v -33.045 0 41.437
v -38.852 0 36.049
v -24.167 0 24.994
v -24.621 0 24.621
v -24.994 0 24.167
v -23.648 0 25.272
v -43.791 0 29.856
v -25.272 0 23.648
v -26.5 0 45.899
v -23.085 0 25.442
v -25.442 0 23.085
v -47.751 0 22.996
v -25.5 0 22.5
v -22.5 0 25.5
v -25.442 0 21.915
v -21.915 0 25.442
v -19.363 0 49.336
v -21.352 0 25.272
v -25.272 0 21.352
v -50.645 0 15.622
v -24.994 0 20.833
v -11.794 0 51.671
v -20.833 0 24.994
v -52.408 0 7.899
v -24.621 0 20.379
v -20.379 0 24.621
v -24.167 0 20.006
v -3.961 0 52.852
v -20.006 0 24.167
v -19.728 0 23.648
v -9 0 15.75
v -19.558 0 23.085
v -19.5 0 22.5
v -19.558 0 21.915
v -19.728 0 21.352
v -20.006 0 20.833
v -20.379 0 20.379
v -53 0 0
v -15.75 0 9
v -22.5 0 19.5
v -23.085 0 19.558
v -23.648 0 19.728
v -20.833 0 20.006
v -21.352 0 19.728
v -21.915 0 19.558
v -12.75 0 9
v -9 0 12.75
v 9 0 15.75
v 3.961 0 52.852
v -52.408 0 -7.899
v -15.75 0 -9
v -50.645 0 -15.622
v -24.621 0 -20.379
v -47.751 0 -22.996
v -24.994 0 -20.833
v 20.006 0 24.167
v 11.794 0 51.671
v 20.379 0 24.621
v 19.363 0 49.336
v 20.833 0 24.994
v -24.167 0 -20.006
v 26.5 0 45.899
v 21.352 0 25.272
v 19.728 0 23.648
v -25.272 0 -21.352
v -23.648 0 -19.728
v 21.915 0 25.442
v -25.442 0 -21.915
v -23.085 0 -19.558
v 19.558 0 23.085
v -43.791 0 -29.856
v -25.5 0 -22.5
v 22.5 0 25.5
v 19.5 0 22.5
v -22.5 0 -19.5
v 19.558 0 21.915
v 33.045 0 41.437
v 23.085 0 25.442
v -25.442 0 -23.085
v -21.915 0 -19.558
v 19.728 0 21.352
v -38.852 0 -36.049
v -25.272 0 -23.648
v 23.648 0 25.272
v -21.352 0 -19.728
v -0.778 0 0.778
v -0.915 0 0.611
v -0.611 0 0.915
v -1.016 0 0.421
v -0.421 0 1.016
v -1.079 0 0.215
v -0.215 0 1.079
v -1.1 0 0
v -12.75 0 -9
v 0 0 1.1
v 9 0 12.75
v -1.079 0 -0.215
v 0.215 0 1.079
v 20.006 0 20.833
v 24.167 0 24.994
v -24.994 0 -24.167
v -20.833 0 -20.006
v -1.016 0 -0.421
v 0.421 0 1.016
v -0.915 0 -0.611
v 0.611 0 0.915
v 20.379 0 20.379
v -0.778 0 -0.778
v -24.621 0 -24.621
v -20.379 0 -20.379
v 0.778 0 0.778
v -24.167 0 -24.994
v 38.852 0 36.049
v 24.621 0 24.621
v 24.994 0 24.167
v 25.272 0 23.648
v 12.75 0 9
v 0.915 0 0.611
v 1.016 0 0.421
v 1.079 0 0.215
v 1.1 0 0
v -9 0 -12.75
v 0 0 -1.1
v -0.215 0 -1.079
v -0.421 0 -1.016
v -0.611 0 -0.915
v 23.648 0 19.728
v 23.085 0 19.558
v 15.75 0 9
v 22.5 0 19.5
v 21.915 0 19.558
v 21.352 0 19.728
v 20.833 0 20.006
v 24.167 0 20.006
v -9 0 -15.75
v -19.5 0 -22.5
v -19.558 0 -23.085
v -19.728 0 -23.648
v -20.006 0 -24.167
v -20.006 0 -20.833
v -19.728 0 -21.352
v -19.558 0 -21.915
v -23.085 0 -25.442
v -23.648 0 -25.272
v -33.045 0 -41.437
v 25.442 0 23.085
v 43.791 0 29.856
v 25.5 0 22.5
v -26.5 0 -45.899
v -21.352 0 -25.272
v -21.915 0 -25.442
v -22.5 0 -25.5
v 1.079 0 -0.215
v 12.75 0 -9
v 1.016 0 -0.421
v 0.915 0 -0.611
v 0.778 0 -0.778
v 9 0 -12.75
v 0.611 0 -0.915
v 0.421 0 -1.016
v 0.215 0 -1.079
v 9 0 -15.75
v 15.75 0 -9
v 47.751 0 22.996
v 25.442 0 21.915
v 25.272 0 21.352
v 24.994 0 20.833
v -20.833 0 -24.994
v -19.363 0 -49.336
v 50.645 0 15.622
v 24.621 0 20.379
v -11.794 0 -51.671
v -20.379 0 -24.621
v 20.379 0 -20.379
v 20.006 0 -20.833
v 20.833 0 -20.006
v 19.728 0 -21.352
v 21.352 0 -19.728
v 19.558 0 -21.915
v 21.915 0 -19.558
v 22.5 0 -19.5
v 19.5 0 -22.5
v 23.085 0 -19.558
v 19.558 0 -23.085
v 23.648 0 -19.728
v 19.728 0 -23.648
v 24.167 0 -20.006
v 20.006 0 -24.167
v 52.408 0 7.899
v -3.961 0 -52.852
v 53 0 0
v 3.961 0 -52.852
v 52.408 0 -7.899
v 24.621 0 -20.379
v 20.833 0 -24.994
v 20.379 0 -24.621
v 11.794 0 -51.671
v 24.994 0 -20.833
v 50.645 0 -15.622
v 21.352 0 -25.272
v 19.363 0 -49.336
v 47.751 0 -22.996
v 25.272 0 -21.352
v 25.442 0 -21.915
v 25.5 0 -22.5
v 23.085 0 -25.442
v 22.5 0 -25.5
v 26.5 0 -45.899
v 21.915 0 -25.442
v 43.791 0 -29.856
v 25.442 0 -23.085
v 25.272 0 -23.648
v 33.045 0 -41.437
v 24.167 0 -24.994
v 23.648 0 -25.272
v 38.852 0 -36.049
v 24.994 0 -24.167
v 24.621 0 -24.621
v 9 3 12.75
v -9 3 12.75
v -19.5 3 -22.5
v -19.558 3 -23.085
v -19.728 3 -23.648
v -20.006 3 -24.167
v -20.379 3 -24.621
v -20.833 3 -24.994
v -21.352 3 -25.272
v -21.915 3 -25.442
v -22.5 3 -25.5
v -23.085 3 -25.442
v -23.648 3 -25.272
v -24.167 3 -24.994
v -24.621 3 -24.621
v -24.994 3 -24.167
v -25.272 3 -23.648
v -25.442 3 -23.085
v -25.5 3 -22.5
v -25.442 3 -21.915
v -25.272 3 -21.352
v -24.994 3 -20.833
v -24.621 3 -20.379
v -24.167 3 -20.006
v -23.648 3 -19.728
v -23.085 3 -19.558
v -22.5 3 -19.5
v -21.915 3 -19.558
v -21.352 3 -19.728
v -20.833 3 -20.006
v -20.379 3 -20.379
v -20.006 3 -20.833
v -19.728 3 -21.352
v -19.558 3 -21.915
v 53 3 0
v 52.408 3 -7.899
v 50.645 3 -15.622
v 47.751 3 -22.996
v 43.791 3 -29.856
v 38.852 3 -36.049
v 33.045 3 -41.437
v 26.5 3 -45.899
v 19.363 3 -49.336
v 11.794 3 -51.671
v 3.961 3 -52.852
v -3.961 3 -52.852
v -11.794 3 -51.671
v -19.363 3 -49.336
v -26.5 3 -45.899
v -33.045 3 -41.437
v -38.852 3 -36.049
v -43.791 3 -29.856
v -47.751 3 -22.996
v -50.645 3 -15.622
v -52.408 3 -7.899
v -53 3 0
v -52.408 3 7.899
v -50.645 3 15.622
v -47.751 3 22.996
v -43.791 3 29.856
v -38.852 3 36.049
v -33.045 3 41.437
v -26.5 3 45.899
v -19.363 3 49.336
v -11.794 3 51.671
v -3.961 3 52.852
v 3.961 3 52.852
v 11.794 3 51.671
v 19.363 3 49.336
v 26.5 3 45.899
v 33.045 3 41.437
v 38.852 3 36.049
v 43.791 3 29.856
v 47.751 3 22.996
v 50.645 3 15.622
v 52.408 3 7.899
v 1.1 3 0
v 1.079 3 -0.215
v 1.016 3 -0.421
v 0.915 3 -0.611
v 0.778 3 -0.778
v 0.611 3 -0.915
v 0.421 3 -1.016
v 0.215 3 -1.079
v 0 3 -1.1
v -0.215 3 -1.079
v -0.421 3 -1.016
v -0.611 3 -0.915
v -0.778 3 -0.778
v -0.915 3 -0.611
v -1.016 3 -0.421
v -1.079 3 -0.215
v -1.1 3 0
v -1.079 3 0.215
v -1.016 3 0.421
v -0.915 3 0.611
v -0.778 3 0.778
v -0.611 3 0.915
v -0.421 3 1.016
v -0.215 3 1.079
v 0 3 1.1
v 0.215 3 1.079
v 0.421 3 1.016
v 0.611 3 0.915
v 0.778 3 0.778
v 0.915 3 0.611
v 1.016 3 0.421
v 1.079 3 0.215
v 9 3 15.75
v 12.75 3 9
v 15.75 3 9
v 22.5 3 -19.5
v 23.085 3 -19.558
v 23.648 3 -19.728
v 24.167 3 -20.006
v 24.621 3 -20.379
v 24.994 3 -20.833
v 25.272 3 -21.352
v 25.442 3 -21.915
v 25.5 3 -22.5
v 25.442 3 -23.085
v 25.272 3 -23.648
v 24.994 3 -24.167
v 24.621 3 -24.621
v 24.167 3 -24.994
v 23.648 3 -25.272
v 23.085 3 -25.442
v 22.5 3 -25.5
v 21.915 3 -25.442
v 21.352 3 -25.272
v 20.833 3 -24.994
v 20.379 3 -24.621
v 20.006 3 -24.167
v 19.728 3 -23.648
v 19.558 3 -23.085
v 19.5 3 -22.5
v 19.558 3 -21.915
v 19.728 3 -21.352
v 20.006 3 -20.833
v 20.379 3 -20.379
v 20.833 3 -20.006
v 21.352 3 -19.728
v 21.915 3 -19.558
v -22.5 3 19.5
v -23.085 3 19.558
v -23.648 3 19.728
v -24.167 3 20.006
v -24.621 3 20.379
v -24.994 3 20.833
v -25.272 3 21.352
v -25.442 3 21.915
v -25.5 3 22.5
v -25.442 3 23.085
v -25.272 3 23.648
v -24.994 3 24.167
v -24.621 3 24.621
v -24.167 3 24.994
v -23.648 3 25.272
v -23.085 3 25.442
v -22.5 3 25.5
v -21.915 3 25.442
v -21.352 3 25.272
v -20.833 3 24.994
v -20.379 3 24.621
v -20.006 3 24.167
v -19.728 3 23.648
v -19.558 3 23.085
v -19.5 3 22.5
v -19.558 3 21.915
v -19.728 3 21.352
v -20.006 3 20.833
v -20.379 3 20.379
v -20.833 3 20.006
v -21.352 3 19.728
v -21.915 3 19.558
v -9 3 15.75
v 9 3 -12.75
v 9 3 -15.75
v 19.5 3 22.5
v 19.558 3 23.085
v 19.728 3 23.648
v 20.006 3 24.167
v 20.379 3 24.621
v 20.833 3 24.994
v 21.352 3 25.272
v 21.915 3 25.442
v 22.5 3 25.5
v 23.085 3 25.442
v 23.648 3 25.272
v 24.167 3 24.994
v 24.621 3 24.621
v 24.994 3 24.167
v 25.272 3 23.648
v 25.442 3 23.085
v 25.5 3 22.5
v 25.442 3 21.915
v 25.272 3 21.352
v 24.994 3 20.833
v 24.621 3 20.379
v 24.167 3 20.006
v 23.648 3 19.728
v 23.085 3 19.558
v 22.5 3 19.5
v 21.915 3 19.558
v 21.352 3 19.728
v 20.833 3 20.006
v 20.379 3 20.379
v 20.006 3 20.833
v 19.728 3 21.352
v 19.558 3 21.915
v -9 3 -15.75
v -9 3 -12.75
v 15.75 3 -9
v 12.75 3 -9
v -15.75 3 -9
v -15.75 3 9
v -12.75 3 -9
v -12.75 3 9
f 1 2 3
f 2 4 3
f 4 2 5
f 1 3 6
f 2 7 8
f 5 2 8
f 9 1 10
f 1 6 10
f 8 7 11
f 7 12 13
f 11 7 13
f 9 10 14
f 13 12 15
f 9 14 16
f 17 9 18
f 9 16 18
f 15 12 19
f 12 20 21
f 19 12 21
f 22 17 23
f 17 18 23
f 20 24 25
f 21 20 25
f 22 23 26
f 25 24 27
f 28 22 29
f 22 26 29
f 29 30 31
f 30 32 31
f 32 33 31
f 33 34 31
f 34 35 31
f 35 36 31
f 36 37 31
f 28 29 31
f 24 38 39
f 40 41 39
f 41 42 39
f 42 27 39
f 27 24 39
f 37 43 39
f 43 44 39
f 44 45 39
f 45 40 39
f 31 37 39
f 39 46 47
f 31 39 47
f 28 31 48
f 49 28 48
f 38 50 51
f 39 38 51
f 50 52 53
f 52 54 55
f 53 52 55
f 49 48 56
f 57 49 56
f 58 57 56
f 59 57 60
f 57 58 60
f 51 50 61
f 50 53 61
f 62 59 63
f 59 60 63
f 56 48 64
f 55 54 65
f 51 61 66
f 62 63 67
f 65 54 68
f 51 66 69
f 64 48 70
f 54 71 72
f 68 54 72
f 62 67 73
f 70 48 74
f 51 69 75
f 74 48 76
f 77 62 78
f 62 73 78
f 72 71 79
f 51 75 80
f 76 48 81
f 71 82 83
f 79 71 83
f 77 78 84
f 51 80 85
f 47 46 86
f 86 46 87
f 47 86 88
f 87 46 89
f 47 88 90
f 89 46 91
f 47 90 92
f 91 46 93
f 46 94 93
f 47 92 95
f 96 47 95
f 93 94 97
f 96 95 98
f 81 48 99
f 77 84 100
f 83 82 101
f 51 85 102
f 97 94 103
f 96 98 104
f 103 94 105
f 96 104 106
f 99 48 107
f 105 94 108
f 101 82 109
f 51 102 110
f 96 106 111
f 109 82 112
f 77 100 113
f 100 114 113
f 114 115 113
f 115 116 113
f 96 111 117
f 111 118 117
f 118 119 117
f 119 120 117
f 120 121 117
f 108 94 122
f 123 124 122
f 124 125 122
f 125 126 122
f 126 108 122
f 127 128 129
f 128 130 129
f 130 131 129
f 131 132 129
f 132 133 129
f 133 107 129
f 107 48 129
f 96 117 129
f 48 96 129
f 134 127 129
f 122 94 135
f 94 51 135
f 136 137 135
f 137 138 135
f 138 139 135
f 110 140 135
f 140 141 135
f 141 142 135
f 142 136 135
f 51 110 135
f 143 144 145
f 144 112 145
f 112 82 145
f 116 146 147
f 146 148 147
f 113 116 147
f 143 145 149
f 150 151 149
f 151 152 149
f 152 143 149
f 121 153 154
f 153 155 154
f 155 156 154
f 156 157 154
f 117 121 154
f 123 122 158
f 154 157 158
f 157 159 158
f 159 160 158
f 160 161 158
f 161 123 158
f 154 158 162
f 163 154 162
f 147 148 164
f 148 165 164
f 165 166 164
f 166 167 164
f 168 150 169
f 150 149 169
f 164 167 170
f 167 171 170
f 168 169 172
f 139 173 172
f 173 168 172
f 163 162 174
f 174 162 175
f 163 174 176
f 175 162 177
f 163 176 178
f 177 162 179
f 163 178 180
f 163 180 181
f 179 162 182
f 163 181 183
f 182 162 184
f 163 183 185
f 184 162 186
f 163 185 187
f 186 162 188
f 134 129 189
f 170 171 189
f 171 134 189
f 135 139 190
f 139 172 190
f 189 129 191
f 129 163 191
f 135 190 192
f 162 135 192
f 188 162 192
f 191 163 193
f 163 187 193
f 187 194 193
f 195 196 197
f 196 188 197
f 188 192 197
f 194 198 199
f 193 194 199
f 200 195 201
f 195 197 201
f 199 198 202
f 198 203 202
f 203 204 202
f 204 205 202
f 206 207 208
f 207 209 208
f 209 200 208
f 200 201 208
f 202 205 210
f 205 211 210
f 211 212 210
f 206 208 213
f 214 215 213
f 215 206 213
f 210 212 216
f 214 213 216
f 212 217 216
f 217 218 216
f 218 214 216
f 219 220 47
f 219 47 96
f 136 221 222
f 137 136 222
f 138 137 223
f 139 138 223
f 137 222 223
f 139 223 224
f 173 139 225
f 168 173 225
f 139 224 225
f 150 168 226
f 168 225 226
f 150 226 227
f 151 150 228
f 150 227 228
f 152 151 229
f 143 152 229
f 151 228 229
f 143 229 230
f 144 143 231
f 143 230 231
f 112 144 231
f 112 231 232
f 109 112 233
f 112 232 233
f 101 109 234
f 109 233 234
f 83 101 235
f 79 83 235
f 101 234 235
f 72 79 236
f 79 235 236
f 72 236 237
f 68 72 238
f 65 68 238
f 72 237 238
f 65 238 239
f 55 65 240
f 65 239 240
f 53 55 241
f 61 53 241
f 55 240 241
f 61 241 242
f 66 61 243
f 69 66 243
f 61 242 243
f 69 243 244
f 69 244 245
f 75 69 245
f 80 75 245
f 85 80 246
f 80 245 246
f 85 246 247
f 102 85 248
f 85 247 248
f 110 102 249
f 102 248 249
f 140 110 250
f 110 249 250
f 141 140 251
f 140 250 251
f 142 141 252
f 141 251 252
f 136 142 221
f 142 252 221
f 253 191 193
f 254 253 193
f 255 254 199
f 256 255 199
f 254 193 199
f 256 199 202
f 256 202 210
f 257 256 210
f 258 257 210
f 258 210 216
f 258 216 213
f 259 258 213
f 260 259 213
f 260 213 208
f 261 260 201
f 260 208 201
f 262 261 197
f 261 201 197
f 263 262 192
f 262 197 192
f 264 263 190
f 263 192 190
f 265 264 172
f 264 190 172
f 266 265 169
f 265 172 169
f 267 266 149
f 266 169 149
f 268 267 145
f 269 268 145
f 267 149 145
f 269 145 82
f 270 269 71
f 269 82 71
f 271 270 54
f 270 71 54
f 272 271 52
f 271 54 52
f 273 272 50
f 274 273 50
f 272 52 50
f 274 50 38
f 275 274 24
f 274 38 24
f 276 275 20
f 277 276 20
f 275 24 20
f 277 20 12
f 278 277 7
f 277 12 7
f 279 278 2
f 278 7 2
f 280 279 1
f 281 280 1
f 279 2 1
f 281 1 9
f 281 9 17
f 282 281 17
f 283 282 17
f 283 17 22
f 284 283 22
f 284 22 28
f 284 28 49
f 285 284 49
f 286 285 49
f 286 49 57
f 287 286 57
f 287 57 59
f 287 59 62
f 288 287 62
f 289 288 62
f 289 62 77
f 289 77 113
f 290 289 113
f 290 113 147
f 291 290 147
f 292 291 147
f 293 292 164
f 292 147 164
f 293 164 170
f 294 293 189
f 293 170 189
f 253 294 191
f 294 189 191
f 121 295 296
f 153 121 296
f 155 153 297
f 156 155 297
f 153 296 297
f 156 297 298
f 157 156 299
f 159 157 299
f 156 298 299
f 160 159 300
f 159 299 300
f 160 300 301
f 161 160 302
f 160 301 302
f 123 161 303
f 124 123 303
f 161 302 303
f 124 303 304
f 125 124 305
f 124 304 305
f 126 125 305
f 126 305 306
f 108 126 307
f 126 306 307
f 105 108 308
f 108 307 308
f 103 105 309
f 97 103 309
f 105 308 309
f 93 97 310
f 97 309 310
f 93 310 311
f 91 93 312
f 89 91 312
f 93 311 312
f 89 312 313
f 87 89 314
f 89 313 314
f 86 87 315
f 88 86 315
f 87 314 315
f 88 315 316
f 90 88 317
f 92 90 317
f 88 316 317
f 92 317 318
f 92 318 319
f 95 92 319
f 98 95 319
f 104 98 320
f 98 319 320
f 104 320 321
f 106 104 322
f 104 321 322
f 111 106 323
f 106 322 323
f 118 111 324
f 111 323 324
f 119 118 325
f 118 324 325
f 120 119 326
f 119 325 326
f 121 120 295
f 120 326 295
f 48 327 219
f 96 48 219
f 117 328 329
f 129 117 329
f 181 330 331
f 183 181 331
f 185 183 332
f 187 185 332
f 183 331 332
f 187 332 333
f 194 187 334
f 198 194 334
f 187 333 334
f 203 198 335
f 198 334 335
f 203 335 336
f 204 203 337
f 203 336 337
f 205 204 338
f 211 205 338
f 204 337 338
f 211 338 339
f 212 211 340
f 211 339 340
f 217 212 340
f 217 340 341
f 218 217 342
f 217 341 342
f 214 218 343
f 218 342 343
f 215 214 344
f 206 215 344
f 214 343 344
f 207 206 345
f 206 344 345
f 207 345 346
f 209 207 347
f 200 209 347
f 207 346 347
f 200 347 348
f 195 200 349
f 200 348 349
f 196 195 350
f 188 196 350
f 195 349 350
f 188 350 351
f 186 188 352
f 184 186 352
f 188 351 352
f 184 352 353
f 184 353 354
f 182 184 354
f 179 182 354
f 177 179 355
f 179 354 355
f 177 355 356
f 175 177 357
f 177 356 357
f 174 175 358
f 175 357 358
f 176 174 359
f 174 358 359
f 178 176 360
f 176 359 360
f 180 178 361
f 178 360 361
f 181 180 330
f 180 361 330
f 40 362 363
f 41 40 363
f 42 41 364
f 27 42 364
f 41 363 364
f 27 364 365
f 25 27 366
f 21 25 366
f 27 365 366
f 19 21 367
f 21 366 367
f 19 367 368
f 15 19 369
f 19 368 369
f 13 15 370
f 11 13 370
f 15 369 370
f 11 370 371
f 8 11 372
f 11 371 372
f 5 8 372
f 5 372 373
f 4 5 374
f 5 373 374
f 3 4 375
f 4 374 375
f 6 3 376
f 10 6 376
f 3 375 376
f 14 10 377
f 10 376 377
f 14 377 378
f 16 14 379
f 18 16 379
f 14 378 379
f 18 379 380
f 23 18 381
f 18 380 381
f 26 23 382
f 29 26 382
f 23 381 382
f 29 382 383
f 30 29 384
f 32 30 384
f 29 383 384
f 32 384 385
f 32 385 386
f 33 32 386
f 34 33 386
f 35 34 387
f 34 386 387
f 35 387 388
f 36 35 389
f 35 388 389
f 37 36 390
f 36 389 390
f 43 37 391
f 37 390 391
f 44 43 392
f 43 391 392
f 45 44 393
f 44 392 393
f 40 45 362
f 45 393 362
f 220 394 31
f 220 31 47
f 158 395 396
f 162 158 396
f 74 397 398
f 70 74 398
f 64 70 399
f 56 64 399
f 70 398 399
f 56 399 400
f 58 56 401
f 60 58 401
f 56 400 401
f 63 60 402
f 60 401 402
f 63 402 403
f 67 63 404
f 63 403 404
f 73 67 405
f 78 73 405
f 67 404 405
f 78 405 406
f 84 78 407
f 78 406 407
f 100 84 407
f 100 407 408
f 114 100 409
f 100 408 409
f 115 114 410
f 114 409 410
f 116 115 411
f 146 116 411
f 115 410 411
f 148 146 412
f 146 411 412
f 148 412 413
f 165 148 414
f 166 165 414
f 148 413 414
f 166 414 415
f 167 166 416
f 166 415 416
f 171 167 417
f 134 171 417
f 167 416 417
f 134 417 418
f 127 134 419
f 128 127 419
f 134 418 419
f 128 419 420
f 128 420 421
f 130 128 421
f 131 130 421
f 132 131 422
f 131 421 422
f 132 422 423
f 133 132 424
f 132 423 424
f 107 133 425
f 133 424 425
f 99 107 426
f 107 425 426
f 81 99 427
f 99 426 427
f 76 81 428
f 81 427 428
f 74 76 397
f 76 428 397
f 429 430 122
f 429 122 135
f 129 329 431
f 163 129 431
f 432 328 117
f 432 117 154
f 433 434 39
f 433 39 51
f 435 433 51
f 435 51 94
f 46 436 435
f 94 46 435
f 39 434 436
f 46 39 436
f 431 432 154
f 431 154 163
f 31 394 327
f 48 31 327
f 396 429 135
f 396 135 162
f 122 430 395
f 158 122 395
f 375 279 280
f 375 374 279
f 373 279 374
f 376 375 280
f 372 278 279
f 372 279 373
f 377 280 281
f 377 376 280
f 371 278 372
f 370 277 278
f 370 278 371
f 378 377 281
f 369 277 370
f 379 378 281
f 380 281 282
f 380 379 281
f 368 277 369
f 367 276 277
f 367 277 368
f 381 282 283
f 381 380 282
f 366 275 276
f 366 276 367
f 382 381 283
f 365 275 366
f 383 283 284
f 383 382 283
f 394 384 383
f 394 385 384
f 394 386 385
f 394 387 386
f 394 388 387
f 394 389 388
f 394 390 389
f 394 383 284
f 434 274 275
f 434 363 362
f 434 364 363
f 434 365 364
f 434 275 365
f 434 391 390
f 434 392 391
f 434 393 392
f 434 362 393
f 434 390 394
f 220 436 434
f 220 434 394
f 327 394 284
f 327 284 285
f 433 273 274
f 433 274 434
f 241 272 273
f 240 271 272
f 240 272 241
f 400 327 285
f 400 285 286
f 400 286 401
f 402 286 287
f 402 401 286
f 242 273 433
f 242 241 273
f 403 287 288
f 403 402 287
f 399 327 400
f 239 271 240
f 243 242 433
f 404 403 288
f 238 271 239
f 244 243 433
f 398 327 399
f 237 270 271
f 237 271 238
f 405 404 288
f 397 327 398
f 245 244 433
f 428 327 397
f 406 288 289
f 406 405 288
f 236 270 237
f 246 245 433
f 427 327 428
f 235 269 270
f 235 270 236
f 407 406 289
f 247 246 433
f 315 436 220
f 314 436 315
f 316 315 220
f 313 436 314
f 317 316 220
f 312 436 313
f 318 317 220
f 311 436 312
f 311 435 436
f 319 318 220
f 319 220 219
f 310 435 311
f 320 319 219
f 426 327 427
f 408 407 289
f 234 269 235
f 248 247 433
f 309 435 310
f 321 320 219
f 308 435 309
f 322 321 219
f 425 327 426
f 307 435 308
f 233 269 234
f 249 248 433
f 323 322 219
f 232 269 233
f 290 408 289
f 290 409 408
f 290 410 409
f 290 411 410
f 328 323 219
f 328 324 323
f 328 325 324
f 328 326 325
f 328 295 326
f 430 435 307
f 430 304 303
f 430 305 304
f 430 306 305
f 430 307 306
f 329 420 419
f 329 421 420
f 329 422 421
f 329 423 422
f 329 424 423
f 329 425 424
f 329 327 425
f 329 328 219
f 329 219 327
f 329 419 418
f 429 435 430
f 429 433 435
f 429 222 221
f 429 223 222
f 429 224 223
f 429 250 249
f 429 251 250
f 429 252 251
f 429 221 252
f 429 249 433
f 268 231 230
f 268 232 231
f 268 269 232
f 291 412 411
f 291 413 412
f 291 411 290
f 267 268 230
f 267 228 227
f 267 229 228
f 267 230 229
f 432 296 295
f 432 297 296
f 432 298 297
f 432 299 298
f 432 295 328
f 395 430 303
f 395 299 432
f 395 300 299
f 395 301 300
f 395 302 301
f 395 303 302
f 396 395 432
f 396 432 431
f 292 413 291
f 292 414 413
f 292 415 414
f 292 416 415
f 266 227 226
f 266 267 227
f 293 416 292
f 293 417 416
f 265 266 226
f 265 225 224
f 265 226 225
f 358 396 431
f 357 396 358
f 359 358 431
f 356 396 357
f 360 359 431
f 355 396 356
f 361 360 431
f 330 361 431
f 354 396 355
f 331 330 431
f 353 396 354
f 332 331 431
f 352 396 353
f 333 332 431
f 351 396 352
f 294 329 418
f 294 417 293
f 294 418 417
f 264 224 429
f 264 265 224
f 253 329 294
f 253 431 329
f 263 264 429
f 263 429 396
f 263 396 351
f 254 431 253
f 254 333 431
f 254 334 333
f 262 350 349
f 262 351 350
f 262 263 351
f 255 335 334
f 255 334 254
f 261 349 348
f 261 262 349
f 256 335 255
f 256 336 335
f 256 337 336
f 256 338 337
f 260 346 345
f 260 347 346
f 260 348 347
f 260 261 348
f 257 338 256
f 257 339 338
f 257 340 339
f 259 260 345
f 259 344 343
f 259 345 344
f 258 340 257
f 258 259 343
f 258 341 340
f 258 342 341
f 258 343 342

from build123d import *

# Parameters (mm, degrees)
SKETCH1_R           = 53
BOSS_EXTRUDE1_DEPTH = 3
SKETCH2_R           = 1.1
SKETCH2_W           = 18
SKETCH2_H           = 3
SKETCH2_W_2         = 3
SKETCH2_H_2         = 18
CUT_EXTRUDE1_DEPTH  = 3
SKETCH4_R           = 3
CUT_EXTRUDE2_DEPTH  = 3
CIRPATTERN1_COUNT   = 4


with BuildPart() as part:
    # Sketch1 → Boss-Extrude1 (new body)
    with BuildSketch(Plane(origin=(0, 0, 0), x_dir=(1, 0, 0), z_dir=(0, 1, 0))):
        Circle(SKETCH1_R)
    extrude(amount=BOSS_EXTRUDE1_DEPTH)

    # Sketch2 → Cut-Extrude1 (cut)
    with BuildSketch(Plane(origin=(0, 3, 0), x_dir=(1, 0, 0), z_dir=(0, 1, 0))):
        Circle(SKETCH2_R)
        with Locations((0, 14.25)):
            Rectangle(SKETCH2_W, SKETCH2_H)
        with Locations((-14.25, 0)):
            Rectangle(SKETCH2_W_2, SKETCH2_H_2)
        with Locations((0, -14.25)):
            Rectangle(SKETCH2_W, SKETCH2_H)
        with Locations((14.25, 0)):
            Rectangle(SKETCH2_W_2, SKETCH2_H_2)
    extrude(amount=-CUT_EXTRUDE1_DEPTH, mode=Mode.SUBTRACT)

    # Sketch4 → Cut-Extrude2 (cut)
    with BuildSketch(Plane(origin=(0, 3, 0), x_dir=(1, 0, 0), z_dir=(0, 1, 0))):
        with Locations((-22.5, 22.5)):
            Circle(SKETCH4_R)
    cut_extrude2 = extrude(amount=-CUT_EXTRUDE2_DEPTH, mode=Mode.SUBTRACT)

    # CirPattern1: Cut-Extrude2 ×4 about axis
    cirpattern1_axis = Axis((0, 0, 0), (0, 1, 0))
    for i in range(1, CIRPATTERN1_COUNT):
        add(cut_extrude2.rotate(cirpattern1_axis, i * 360 / CIRPATTERN1_COUNT), mode=Mode.SUBTRACT)


solid = part.part
